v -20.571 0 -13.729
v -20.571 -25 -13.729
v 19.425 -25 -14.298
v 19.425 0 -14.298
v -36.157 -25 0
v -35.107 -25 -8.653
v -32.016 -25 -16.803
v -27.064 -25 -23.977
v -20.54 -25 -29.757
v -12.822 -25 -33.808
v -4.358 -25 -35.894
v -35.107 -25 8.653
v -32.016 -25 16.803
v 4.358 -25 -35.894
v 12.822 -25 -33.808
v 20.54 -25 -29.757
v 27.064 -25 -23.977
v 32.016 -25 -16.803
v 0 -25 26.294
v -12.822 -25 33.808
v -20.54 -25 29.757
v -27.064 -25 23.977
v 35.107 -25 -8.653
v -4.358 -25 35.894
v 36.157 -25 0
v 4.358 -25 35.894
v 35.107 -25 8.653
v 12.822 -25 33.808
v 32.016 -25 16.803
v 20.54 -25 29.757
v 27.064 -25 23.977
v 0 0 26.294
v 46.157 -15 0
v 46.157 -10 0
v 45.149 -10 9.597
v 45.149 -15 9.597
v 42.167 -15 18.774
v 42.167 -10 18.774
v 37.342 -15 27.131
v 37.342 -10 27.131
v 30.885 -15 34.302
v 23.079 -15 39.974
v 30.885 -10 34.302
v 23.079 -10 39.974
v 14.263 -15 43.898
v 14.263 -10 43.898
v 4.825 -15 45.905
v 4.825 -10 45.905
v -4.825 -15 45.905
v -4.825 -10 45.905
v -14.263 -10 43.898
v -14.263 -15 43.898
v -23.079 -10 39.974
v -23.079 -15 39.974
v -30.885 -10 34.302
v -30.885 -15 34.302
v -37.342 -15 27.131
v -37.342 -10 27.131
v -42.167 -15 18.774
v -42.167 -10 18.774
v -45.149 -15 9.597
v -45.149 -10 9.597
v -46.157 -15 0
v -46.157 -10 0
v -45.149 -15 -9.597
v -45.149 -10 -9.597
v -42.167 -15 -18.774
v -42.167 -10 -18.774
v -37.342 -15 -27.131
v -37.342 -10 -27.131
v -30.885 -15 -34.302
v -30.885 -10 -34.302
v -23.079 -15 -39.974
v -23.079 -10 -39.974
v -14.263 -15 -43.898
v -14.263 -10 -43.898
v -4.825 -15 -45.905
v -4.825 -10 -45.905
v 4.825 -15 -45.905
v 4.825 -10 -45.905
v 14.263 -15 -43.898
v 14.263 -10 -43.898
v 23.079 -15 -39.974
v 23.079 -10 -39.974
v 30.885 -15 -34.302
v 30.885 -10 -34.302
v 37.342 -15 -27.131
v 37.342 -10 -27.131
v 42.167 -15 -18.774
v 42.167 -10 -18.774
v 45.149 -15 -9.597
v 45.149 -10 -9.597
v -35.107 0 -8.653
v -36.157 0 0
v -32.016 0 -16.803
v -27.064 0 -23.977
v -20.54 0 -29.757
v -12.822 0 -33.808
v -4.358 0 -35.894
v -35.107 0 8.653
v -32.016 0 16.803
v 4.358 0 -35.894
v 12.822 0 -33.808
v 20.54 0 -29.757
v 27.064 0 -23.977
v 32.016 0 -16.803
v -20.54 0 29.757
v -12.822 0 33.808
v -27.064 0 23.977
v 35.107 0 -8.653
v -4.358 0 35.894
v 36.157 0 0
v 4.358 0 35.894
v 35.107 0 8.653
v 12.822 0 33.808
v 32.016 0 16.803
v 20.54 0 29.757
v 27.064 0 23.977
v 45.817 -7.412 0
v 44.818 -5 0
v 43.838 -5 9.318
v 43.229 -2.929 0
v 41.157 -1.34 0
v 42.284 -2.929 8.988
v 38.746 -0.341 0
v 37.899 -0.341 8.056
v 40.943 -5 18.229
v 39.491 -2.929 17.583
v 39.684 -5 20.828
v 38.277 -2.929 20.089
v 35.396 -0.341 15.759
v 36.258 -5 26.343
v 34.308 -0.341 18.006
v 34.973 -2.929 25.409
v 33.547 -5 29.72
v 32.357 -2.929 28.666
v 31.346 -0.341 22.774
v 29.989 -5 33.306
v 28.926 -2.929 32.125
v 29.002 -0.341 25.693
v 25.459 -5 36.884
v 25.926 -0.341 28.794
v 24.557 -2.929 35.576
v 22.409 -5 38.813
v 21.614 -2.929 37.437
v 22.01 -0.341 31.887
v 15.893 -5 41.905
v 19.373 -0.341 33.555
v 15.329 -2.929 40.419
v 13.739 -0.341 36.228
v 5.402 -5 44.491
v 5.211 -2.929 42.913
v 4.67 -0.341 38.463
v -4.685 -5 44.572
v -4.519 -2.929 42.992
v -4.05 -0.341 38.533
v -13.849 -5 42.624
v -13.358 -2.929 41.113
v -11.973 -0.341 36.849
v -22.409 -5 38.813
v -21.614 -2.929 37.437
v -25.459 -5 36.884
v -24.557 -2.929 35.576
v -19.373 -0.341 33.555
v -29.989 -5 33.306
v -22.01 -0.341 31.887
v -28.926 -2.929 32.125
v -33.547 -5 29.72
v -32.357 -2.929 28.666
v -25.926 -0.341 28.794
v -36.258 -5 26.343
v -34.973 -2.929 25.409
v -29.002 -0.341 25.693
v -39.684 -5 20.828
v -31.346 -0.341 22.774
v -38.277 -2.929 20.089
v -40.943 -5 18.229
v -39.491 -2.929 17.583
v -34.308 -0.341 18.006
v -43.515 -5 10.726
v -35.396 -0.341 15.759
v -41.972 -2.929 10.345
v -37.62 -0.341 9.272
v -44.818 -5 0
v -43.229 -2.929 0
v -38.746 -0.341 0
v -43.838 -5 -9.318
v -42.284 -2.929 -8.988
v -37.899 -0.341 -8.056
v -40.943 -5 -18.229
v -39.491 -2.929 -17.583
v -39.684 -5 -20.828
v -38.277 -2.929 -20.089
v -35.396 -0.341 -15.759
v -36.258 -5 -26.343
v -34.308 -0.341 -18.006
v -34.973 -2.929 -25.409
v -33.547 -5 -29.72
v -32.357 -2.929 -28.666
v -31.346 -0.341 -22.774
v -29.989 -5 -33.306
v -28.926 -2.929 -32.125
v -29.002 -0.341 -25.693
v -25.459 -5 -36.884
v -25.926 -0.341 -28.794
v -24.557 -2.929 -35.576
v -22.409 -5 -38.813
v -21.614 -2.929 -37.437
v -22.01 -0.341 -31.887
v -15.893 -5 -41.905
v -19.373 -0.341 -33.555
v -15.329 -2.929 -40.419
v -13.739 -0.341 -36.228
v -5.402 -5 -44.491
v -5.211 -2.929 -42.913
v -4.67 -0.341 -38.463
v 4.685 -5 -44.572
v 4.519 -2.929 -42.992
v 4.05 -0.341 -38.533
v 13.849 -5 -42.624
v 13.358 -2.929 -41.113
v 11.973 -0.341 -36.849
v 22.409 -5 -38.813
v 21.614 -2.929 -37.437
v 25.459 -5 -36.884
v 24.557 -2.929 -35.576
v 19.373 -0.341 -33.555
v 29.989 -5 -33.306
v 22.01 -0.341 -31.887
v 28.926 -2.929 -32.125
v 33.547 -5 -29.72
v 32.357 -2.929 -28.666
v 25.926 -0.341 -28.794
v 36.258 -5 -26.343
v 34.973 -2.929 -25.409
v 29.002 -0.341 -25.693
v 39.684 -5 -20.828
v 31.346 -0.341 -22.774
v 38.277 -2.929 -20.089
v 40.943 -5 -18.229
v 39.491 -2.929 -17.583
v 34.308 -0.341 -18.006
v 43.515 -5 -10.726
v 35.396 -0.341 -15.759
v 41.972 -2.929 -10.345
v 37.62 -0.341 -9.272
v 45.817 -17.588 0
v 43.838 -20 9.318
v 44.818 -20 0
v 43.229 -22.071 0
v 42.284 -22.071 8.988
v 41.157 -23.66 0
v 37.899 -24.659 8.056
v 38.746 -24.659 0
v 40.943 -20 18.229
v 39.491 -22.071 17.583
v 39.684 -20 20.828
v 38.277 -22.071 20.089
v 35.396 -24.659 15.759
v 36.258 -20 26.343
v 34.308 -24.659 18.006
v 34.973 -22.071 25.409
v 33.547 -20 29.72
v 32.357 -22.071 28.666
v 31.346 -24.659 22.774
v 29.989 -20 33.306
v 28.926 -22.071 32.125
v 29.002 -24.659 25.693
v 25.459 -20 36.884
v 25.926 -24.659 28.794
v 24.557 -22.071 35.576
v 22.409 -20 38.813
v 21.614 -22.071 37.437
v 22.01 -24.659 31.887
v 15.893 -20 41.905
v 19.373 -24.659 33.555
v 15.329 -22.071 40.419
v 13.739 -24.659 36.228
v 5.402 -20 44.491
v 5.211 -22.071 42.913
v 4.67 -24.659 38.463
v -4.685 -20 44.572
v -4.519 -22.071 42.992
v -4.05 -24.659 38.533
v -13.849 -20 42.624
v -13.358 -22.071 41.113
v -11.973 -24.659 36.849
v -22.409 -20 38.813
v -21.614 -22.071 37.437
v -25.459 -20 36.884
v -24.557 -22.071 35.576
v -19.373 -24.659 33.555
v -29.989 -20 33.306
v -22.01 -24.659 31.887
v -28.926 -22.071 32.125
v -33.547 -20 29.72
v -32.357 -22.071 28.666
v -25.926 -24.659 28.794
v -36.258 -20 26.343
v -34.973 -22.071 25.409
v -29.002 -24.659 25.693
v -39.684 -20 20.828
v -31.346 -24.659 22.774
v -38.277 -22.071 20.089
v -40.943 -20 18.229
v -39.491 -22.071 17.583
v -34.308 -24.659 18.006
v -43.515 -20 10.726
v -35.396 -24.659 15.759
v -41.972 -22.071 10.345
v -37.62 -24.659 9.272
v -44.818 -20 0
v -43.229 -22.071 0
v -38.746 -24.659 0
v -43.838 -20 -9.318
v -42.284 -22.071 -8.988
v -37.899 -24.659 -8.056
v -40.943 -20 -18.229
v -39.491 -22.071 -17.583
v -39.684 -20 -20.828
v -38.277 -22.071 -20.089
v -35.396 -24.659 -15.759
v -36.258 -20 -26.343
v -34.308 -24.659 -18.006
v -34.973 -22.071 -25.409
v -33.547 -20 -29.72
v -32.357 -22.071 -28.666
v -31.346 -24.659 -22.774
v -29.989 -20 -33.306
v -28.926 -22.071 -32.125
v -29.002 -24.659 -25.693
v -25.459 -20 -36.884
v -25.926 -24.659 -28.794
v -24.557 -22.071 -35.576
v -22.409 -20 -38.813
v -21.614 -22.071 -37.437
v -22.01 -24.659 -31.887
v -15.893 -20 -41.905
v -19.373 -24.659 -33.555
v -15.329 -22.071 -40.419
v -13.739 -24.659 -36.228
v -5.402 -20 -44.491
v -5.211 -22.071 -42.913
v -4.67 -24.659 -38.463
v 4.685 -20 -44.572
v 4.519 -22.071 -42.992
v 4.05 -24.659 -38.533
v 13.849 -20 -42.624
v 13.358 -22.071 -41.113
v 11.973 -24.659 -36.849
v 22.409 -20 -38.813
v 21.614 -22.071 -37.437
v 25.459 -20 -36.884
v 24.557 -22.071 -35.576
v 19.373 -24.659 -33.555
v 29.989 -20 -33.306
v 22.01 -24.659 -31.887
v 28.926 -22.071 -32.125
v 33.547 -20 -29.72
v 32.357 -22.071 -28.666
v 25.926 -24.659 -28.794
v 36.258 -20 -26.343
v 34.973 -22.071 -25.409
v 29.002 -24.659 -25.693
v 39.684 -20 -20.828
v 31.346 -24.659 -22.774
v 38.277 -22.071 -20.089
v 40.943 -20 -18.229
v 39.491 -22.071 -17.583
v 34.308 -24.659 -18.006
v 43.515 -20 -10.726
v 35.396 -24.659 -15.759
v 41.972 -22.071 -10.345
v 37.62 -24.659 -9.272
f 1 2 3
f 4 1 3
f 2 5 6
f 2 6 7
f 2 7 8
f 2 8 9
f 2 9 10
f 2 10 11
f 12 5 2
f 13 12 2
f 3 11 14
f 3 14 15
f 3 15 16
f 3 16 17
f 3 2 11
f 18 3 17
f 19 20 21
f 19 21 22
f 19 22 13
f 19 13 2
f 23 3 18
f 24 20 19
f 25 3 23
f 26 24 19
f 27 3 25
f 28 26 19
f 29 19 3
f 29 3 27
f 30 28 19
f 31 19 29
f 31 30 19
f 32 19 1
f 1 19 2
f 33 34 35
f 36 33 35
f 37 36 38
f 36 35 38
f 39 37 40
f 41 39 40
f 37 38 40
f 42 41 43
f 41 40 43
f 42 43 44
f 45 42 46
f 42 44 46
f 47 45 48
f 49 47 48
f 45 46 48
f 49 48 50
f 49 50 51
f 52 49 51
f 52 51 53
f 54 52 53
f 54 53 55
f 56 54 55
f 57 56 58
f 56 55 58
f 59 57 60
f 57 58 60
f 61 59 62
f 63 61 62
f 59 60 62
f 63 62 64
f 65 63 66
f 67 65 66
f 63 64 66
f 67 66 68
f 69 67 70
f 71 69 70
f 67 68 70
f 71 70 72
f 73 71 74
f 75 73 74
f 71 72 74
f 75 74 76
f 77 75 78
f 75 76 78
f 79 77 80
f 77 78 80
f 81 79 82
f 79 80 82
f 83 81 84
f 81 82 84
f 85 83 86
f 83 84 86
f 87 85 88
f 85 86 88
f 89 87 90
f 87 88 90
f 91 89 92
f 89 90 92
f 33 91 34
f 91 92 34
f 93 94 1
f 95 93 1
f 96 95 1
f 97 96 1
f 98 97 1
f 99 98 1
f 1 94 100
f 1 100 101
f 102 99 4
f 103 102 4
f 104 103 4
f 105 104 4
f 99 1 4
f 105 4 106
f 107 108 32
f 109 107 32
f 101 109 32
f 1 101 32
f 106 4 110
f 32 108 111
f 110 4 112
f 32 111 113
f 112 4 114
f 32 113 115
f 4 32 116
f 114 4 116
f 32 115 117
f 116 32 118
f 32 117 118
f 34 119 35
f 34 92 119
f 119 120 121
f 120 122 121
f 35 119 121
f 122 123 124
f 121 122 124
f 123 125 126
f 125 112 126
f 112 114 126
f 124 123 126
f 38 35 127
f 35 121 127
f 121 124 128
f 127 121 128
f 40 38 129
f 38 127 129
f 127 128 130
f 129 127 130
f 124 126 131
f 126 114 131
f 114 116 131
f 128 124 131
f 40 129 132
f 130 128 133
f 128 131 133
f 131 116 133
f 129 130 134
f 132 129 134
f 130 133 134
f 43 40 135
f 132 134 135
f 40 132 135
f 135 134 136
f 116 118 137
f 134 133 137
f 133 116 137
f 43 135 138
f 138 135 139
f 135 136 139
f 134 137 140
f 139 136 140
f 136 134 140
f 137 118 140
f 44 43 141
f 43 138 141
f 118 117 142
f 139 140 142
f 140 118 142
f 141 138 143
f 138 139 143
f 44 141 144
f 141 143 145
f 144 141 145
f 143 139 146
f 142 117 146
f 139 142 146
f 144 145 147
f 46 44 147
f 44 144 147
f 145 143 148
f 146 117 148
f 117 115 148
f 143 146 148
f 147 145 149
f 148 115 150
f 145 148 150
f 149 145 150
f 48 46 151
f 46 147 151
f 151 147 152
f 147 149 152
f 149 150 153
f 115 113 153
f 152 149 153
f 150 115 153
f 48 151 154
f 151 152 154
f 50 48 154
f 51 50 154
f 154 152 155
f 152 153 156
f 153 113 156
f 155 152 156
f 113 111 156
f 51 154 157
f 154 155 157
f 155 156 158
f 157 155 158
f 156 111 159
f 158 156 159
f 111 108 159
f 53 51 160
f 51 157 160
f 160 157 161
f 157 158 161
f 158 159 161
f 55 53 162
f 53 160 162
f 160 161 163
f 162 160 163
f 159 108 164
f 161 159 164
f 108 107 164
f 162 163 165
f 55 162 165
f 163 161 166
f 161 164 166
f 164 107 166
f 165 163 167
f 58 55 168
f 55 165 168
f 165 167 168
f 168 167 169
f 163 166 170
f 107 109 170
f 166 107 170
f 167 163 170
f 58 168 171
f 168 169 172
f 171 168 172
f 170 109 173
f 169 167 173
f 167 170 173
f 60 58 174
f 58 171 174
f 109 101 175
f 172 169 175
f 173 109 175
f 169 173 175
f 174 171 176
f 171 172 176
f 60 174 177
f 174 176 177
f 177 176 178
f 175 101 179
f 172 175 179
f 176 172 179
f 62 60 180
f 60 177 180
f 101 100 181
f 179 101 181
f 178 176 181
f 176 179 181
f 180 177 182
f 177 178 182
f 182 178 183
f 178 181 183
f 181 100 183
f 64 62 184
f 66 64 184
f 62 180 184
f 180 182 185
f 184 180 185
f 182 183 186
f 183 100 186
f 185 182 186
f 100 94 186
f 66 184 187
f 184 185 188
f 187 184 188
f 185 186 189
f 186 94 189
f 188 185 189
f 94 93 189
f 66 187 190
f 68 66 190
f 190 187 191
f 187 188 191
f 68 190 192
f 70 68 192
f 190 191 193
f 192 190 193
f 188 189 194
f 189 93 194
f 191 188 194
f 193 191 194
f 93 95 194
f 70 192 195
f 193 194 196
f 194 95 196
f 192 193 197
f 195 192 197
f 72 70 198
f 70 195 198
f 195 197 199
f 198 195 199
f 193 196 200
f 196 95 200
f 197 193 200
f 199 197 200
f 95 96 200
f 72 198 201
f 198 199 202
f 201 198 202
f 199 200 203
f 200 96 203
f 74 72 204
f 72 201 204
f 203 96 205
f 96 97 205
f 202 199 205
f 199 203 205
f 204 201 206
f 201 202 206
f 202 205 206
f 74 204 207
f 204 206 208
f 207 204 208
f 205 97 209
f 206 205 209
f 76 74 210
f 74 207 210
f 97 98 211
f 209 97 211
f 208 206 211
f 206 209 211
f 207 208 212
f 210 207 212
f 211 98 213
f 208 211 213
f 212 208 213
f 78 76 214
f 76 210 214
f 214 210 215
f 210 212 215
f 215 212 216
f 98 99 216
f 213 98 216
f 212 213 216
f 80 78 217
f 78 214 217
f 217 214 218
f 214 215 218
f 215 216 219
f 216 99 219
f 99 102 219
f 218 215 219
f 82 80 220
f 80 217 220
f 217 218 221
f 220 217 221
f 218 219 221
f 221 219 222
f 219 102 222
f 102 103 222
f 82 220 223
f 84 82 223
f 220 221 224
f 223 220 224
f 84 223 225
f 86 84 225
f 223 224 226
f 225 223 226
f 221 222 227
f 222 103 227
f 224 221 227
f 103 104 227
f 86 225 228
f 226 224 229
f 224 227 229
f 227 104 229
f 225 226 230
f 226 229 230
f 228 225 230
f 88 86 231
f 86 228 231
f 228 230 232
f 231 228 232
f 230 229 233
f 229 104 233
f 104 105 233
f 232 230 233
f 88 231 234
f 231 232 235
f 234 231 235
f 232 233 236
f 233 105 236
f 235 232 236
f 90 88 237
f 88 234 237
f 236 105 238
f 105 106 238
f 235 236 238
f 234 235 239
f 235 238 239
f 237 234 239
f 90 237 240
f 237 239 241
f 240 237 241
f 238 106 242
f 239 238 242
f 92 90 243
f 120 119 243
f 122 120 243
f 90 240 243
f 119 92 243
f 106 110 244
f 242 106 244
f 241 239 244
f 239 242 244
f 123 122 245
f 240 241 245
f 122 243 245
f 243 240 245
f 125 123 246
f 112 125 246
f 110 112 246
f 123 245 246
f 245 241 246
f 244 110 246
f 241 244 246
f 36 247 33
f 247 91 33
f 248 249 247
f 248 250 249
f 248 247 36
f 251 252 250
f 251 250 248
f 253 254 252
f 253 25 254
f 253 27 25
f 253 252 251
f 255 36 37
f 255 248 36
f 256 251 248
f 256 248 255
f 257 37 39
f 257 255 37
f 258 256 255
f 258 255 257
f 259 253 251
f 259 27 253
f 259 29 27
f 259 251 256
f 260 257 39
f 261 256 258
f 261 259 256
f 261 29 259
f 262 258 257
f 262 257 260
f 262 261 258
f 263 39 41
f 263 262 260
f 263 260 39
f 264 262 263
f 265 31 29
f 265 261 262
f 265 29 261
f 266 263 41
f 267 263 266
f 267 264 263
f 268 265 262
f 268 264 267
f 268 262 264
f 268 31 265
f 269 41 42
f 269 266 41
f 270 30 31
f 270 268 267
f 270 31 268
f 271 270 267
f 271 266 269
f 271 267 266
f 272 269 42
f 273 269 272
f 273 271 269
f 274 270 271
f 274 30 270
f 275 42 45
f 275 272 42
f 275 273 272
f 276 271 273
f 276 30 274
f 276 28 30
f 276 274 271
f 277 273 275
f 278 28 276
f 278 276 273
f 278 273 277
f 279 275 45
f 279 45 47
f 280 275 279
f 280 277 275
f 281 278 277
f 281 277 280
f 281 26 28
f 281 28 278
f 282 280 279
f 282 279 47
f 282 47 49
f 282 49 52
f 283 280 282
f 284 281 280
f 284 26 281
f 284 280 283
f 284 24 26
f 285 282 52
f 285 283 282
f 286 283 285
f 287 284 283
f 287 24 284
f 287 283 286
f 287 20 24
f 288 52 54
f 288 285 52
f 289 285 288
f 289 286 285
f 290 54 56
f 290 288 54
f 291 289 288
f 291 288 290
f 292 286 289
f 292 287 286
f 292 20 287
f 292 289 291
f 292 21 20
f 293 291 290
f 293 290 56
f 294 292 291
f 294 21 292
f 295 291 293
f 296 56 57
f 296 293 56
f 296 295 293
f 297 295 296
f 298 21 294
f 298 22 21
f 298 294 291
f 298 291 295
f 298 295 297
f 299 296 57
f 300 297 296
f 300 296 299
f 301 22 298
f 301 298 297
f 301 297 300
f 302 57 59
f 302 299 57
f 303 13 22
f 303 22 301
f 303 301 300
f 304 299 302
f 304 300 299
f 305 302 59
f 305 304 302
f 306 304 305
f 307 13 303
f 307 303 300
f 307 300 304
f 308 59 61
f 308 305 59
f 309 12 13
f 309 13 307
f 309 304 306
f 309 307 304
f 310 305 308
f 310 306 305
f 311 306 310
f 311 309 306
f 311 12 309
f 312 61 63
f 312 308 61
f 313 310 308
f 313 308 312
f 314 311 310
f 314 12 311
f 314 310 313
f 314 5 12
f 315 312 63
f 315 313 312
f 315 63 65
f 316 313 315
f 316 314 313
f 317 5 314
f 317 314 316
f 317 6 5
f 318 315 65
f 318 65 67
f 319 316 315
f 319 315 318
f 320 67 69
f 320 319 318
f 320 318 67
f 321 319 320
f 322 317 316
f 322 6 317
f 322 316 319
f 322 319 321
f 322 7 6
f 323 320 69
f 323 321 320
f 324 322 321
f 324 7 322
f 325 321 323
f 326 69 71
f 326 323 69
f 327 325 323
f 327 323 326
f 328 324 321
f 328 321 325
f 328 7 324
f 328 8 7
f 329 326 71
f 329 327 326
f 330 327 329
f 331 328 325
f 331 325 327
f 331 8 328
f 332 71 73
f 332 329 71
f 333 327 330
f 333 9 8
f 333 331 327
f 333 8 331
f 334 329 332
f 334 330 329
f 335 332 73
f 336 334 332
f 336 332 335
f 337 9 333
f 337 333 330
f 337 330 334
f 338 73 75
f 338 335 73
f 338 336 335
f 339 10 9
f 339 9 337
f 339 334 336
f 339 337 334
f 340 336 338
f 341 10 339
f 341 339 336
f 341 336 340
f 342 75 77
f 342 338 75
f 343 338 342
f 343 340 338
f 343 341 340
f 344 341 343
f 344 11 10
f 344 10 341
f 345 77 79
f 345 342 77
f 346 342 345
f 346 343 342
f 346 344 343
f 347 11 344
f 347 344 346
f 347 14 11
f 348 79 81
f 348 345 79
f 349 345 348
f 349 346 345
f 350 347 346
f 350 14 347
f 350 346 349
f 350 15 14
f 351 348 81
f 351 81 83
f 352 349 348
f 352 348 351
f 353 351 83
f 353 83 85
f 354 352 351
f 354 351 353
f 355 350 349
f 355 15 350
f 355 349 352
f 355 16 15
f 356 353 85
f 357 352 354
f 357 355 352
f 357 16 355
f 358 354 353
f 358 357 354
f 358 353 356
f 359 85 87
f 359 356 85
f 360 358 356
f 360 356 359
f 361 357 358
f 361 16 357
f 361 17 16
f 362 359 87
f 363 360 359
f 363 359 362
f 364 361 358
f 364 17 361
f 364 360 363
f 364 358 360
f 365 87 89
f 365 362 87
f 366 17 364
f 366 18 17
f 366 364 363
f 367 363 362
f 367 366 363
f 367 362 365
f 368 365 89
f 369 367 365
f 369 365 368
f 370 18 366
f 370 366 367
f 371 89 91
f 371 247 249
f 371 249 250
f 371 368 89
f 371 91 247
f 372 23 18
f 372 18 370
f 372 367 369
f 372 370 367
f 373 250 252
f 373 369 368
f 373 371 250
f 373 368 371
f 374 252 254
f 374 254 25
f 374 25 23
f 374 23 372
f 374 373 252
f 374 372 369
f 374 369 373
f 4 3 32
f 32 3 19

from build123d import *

# Parameters (mm, degrees)
F0_R     = 46.157486
F1_DEPTH = 25
F3_DEPTH = 25
F4_R     = 10


with BuildPart() as f1:
    # F0 (on Front) → F1 (new body)
    with BuildSketch(Plane.XZ):
        Circle(F0_R)
    extrude(amount=F1_DEPTH)

    # F2 (on face) → F3 (cut)
    with BuildSketch(Plane.XZ.offset(25)):
        Polygon((0, 26.293665), (-20.571175, -13.729163), (19.424781, -14.297934), align=None)
    extrude(amount=-F3_DEPTH, mode=Mode.SUBTRACT)

    # F4
    f4_edges = [f1.edges().sort_by_distance(p)[0] for p in [
        (-46.157486, -25, 0),
        (-46.157486, 0, 0),
    ]]
    fillet(f4_edges, radius=F4_R)


solid = f1.part
